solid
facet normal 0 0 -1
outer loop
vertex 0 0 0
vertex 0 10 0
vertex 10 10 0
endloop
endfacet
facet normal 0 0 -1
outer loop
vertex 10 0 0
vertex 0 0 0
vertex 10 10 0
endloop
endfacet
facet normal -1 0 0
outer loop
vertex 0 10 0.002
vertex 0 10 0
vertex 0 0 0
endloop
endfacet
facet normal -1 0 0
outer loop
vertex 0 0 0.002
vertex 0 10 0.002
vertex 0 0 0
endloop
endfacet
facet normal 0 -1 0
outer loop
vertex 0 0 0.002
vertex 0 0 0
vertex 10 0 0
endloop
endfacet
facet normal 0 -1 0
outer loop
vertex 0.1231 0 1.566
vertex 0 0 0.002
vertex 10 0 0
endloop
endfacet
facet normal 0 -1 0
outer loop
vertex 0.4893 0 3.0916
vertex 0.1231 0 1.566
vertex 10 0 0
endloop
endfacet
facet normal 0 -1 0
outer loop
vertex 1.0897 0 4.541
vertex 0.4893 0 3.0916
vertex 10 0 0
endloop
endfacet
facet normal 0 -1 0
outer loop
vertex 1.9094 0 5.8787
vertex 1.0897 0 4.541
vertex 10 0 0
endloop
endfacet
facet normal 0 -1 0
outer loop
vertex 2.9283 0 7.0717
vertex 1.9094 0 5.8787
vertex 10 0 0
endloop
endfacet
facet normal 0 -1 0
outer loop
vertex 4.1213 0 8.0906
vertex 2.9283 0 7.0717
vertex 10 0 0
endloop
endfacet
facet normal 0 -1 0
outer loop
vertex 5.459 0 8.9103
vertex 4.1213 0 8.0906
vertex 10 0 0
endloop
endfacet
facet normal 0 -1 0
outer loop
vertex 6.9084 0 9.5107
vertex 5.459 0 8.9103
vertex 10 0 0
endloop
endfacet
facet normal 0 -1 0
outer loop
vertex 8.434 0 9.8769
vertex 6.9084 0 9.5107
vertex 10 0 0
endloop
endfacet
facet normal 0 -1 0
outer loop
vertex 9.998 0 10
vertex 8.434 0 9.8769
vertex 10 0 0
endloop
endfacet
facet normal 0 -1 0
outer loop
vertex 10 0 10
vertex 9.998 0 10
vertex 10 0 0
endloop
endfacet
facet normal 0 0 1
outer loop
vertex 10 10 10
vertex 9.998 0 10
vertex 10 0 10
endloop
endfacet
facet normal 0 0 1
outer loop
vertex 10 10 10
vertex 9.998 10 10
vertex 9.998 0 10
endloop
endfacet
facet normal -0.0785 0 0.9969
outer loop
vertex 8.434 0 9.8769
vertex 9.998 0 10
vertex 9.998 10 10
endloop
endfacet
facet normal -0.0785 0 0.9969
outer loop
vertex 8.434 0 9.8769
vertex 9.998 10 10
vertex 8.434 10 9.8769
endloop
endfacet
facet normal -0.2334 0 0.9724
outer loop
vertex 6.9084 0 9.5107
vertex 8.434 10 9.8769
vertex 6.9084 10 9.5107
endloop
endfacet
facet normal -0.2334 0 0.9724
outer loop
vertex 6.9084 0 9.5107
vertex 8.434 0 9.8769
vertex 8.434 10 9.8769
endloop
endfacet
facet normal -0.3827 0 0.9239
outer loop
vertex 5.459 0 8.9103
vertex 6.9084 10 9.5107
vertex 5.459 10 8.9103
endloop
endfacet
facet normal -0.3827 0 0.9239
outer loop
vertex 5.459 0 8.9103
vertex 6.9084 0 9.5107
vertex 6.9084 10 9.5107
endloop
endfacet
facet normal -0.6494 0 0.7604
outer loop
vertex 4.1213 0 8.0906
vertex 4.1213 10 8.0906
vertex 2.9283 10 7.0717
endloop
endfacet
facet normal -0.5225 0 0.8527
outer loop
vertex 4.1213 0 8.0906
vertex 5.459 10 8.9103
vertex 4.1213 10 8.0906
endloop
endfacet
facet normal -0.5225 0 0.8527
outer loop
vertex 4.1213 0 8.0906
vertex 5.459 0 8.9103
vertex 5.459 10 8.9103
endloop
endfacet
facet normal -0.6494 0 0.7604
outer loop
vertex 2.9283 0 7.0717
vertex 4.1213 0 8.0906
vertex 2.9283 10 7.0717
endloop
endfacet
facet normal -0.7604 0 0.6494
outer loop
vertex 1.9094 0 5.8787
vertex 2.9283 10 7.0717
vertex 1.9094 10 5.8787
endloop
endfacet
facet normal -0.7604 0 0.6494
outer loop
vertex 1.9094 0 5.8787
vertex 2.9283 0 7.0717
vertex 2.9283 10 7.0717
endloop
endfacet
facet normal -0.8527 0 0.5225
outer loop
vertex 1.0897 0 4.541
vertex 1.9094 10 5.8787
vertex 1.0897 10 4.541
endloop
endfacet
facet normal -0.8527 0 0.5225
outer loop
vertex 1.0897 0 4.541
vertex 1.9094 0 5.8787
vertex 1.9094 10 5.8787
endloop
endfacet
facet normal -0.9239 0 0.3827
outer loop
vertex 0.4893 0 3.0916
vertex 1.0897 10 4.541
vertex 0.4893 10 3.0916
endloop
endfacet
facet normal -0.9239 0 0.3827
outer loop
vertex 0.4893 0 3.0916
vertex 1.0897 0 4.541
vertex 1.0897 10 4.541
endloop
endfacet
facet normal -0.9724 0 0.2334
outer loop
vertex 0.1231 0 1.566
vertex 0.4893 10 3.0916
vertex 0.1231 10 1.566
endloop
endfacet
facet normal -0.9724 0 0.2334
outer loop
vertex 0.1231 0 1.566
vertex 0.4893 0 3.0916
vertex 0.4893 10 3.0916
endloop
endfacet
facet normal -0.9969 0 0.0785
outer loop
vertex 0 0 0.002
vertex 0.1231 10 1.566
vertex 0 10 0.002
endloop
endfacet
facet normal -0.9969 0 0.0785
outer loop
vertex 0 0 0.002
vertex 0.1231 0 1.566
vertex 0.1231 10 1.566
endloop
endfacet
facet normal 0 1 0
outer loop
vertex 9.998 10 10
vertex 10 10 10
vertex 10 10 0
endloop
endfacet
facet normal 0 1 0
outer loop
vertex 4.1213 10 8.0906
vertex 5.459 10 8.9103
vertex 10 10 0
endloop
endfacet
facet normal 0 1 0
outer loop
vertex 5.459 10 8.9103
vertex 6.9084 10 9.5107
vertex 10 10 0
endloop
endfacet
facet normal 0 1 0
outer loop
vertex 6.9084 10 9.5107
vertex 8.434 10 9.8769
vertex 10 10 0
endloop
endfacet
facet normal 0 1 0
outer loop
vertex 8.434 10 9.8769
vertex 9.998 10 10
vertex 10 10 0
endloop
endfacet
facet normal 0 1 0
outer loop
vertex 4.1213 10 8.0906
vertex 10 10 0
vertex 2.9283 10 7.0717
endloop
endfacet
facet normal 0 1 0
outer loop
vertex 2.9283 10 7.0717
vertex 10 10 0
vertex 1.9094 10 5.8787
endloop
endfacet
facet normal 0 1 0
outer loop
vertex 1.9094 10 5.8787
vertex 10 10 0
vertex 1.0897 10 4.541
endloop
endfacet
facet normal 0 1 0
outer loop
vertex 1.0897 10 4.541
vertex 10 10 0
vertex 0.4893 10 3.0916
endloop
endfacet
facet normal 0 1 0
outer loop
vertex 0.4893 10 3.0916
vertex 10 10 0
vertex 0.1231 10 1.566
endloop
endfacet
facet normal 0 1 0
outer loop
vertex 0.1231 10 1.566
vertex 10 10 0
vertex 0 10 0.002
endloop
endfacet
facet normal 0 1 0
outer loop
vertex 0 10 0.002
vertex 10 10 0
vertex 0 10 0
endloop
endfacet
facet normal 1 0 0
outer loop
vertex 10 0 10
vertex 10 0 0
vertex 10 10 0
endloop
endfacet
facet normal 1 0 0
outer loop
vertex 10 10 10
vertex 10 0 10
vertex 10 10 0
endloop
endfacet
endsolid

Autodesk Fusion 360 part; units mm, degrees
sketch "Sketch1" plane through (0, 0, 0) normal (0, 0, 1) x (1, 0, 0)
  line L0 (0, 0) -> (10, 0)
  line L1 (10, 0) -> (10, 10)
  line L2 (10, 10) -> (0, 10)
  line L3 (0, 10) -> (0, 0)
extrude "Extrude1" add sketch "Sketch1" along normal blind 10
fillet "Fillet1" radius 10 1 edges at (0, 5, 10)
